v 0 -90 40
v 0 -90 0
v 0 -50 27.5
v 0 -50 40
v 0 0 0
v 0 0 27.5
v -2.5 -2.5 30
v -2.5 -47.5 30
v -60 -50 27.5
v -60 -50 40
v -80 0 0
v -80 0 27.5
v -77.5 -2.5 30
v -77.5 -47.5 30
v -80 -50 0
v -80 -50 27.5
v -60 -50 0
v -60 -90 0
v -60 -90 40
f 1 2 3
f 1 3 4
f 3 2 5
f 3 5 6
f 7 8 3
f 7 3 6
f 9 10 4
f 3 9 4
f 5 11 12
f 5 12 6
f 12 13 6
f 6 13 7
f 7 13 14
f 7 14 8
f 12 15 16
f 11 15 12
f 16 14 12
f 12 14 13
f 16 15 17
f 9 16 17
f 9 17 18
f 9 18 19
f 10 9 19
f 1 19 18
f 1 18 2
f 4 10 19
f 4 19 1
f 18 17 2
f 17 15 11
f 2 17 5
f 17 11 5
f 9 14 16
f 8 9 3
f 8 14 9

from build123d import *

# Parameters (mm, degrees)
F0_W     = 80
F0_H     = 50
F1_DEPTH = 30
F2_SIZE  = 2.5
F3_W     = 60
F3_H     = 40
F4_DEPTH = 40


with BuildPart() as f1:
    # F0 (on Top) → F1 (new body)
    with BuildSketch(Plane.XY):
        with Locations((-40, -25)):
            Rectangle(F0_W, F0_H)
    extrude(amount=F1_DEPTH)

    # F2
    f2_edges = [f1.edges().sort_by_distance(p)[0] for p in [
        (0, -25, 30),
        (-40, 0, 30),
        (-80, -25, 30),
        (-40, -50, 30),
    ]]
    chamfer(f2_edges, length=F2_SIZE)

    # F3 (on face) → F4 (join)
    with BuildSketch(Plane.XZ.offset(50)):
        with Locations((-30, 20)):
            Rectangle(F3_W, F3_H)
    extrude(amount=F4_DEPTH)


solid = f1.part
